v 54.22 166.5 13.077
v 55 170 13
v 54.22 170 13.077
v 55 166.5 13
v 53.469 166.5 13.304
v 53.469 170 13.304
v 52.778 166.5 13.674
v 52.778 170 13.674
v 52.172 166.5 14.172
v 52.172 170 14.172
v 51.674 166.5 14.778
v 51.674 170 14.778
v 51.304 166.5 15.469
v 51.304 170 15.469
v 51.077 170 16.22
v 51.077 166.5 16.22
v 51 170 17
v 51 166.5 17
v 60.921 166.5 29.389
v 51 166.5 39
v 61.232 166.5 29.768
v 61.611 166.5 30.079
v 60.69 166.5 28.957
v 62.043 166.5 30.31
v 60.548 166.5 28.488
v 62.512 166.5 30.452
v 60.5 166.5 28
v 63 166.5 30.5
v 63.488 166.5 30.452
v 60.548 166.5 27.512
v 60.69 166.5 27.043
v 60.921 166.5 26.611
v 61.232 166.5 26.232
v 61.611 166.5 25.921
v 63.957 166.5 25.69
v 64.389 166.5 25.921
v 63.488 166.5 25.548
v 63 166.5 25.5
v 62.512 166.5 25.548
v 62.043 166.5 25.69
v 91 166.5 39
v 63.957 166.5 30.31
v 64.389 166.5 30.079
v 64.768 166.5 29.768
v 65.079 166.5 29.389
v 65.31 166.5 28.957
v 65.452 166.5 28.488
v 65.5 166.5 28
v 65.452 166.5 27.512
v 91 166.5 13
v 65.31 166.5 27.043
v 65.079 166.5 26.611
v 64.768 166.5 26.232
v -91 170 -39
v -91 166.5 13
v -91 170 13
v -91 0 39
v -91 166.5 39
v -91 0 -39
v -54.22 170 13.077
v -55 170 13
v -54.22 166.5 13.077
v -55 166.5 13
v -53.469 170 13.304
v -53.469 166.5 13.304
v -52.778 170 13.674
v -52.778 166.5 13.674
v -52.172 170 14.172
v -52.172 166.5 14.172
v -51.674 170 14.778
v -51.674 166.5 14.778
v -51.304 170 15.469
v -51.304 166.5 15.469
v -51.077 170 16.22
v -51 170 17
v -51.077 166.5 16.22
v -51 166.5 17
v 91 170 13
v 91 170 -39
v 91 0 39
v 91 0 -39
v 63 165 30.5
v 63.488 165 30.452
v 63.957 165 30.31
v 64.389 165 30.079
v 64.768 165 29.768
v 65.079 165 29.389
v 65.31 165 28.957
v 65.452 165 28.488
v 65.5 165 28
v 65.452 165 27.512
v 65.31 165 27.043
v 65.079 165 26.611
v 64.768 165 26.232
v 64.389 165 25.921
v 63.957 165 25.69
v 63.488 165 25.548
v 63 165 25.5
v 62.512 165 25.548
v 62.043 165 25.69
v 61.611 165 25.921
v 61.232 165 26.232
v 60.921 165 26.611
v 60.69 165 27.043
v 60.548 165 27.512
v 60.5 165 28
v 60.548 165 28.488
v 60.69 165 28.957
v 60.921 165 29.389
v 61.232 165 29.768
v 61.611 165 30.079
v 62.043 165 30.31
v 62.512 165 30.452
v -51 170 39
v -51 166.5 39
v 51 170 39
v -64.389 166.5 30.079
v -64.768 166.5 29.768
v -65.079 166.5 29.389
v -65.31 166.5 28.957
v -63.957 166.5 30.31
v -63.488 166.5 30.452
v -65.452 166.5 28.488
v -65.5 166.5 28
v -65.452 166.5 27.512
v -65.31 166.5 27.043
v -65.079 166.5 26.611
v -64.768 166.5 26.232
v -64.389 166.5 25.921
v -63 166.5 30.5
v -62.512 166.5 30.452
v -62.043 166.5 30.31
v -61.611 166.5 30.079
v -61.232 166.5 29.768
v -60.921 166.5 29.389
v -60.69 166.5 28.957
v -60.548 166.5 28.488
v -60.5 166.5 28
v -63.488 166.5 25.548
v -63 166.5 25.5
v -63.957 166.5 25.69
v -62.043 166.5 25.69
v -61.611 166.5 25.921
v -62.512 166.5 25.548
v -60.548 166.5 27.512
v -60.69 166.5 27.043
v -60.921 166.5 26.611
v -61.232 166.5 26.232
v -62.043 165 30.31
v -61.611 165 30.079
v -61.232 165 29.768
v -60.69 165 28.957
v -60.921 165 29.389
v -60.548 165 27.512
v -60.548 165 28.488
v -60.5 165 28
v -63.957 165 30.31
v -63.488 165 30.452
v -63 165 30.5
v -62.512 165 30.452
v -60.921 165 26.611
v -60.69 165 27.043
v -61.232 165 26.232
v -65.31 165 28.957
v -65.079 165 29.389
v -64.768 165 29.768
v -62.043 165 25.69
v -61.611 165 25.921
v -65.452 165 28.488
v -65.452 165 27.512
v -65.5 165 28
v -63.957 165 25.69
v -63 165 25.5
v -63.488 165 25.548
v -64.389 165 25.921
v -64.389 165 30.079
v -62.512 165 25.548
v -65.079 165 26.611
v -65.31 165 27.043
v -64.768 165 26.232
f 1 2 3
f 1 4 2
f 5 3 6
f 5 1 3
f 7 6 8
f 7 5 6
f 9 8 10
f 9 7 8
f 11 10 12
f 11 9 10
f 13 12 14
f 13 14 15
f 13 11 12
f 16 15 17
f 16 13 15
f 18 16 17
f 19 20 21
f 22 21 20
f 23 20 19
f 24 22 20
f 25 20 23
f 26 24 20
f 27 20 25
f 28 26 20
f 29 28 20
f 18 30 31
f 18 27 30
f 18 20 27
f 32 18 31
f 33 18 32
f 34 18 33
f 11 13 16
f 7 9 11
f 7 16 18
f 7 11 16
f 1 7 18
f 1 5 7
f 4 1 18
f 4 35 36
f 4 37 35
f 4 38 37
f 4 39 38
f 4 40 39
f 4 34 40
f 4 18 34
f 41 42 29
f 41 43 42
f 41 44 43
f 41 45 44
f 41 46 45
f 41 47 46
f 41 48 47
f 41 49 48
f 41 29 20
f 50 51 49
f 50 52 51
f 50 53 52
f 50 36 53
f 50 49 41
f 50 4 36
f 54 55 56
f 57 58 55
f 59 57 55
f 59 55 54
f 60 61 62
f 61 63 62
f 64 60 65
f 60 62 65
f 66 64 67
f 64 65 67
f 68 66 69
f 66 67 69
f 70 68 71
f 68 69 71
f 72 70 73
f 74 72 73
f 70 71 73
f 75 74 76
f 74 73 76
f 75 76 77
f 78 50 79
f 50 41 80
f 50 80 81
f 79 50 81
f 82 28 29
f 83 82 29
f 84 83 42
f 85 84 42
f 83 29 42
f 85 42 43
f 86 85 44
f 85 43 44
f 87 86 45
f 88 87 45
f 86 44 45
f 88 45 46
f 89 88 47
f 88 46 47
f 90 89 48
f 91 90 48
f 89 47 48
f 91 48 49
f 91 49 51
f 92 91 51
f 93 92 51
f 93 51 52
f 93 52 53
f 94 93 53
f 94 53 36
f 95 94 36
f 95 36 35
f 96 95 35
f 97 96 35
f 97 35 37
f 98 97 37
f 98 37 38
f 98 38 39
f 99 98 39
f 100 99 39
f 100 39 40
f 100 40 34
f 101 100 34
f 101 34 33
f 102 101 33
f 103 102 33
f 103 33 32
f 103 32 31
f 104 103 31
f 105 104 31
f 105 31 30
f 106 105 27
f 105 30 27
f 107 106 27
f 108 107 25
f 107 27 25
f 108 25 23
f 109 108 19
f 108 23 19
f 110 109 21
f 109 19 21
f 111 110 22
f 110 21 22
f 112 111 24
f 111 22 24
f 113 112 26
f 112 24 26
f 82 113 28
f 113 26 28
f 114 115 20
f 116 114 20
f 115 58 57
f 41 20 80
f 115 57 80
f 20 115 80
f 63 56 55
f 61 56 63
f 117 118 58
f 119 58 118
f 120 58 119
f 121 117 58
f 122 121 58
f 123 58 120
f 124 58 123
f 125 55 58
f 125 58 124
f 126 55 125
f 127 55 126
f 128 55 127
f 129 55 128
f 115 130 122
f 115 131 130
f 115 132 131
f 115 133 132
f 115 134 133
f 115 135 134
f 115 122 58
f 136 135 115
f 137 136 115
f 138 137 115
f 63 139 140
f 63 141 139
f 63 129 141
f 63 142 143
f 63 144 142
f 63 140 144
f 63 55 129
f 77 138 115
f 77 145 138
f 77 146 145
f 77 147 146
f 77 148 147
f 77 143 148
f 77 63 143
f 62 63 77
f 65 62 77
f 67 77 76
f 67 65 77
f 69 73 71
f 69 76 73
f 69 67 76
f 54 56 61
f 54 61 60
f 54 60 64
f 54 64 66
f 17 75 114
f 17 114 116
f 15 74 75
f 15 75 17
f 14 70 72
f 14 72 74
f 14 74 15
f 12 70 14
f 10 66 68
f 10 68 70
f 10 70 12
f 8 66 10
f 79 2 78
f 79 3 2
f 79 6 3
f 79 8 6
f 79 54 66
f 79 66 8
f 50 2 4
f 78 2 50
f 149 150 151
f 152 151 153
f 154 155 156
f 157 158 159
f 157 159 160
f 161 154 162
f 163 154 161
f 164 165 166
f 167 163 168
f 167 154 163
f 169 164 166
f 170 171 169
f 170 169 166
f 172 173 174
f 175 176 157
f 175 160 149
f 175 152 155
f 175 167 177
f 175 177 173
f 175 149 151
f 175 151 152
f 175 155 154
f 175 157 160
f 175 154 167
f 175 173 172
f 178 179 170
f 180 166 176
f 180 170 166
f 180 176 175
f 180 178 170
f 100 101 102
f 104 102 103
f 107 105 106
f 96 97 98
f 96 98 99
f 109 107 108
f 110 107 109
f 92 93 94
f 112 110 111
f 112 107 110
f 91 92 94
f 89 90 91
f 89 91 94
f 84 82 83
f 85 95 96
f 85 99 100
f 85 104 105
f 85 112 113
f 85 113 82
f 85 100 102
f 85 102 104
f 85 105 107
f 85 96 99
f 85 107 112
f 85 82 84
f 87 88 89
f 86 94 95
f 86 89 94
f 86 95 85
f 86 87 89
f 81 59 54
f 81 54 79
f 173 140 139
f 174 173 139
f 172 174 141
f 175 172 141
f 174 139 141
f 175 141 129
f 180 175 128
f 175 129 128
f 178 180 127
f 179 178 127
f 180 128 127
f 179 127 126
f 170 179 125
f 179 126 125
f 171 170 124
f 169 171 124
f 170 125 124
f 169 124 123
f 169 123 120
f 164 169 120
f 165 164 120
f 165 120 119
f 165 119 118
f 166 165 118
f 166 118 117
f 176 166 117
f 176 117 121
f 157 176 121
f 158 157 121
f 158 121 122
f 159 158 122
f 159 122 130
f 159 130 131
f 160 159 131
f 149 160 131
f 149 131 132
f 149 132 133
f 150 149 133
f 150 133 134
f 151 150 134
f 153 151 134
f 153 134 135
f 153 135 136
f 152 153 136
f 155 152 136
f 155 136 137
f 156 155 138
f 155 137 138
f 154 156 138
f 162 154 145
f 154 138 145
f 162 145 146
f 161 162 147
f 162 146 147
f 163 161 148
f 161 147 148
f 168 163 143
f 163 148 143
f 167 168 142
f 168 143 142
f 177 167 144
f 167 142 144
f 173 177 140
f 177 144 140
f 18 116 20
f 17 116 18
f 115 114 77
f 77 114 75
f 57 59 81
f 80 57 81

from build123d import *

# Parameters (mm, degrees)
SKETCH1_W           = 182
SKETCH1_H           = 78
BOSS_EXTRUDE1_DEPTH = 170
SKETCH3_R           = 2.5
CUT_EXTRUDE1_DEPTH  = 5
SKETCH4_W           = 40
SKETCH4_H           = 26
CUT_EXTRUDE2_DEPTH  = 3.5
FILLET1_R           = 4


with BuildPart() as part:
    # Sketch1 → Boss-Extrude1 (new body)
    with BuildSketch(Plane(origin=(0, 0, 0), x_dir=(1, 0, 0), z_dir=(0, 1, 0))):
        Rectangle(SKETCH1_W, SKETCH1_H)
    extrude(amount=BOSS_EXTRUDE1_DEPTH)

    # Sketch3 → Cut-Extrude1 (cut)
    with BuildSketch(Plane(origin=(0, 170, 0), x_dir=(1, 0, 0), z_dir=(0, 1, 0))):
        with Locations(Location((63, -28, 0), (0, 0, 270))):
            Circle(SKETCH3_R)
        with Locations(Location((-63, -28, 0), (0, 0, 90))):
            Circle(SKETCH3_R)
    extrude(amount=-CUT_EXTRUDE1_DEPTH, mode=Mode.SUBTRACT)

    # Sketch4 → Cut-Extrude2 (cut)
    with BuildSketch(Plane(origin=(0, 170, 0), x_dir=(1, 0, 0), z_dir=(0, 1, 0))):
        with Locations((-71, -26)):
            Rectangle(SKETCH4_W, SKETCH4_H)
        with Locations((71, -26)):
            Rectangle(SKETCH4_W, SKETCH4_H)
    extrude(amount=-CUT_EXTRUDE2_DEPTH, mode=Mode.SUBTRACT)

    # Fillet1
    fillet1_edges = [part.edges().sort_by_distance(p)[0] for p in [
        (-51, 168.25, 13),
        (51, 168.25, 13),
    ]]
    fillet(fillet1_edges, radius=FILLET1_R)


solid = part.part
